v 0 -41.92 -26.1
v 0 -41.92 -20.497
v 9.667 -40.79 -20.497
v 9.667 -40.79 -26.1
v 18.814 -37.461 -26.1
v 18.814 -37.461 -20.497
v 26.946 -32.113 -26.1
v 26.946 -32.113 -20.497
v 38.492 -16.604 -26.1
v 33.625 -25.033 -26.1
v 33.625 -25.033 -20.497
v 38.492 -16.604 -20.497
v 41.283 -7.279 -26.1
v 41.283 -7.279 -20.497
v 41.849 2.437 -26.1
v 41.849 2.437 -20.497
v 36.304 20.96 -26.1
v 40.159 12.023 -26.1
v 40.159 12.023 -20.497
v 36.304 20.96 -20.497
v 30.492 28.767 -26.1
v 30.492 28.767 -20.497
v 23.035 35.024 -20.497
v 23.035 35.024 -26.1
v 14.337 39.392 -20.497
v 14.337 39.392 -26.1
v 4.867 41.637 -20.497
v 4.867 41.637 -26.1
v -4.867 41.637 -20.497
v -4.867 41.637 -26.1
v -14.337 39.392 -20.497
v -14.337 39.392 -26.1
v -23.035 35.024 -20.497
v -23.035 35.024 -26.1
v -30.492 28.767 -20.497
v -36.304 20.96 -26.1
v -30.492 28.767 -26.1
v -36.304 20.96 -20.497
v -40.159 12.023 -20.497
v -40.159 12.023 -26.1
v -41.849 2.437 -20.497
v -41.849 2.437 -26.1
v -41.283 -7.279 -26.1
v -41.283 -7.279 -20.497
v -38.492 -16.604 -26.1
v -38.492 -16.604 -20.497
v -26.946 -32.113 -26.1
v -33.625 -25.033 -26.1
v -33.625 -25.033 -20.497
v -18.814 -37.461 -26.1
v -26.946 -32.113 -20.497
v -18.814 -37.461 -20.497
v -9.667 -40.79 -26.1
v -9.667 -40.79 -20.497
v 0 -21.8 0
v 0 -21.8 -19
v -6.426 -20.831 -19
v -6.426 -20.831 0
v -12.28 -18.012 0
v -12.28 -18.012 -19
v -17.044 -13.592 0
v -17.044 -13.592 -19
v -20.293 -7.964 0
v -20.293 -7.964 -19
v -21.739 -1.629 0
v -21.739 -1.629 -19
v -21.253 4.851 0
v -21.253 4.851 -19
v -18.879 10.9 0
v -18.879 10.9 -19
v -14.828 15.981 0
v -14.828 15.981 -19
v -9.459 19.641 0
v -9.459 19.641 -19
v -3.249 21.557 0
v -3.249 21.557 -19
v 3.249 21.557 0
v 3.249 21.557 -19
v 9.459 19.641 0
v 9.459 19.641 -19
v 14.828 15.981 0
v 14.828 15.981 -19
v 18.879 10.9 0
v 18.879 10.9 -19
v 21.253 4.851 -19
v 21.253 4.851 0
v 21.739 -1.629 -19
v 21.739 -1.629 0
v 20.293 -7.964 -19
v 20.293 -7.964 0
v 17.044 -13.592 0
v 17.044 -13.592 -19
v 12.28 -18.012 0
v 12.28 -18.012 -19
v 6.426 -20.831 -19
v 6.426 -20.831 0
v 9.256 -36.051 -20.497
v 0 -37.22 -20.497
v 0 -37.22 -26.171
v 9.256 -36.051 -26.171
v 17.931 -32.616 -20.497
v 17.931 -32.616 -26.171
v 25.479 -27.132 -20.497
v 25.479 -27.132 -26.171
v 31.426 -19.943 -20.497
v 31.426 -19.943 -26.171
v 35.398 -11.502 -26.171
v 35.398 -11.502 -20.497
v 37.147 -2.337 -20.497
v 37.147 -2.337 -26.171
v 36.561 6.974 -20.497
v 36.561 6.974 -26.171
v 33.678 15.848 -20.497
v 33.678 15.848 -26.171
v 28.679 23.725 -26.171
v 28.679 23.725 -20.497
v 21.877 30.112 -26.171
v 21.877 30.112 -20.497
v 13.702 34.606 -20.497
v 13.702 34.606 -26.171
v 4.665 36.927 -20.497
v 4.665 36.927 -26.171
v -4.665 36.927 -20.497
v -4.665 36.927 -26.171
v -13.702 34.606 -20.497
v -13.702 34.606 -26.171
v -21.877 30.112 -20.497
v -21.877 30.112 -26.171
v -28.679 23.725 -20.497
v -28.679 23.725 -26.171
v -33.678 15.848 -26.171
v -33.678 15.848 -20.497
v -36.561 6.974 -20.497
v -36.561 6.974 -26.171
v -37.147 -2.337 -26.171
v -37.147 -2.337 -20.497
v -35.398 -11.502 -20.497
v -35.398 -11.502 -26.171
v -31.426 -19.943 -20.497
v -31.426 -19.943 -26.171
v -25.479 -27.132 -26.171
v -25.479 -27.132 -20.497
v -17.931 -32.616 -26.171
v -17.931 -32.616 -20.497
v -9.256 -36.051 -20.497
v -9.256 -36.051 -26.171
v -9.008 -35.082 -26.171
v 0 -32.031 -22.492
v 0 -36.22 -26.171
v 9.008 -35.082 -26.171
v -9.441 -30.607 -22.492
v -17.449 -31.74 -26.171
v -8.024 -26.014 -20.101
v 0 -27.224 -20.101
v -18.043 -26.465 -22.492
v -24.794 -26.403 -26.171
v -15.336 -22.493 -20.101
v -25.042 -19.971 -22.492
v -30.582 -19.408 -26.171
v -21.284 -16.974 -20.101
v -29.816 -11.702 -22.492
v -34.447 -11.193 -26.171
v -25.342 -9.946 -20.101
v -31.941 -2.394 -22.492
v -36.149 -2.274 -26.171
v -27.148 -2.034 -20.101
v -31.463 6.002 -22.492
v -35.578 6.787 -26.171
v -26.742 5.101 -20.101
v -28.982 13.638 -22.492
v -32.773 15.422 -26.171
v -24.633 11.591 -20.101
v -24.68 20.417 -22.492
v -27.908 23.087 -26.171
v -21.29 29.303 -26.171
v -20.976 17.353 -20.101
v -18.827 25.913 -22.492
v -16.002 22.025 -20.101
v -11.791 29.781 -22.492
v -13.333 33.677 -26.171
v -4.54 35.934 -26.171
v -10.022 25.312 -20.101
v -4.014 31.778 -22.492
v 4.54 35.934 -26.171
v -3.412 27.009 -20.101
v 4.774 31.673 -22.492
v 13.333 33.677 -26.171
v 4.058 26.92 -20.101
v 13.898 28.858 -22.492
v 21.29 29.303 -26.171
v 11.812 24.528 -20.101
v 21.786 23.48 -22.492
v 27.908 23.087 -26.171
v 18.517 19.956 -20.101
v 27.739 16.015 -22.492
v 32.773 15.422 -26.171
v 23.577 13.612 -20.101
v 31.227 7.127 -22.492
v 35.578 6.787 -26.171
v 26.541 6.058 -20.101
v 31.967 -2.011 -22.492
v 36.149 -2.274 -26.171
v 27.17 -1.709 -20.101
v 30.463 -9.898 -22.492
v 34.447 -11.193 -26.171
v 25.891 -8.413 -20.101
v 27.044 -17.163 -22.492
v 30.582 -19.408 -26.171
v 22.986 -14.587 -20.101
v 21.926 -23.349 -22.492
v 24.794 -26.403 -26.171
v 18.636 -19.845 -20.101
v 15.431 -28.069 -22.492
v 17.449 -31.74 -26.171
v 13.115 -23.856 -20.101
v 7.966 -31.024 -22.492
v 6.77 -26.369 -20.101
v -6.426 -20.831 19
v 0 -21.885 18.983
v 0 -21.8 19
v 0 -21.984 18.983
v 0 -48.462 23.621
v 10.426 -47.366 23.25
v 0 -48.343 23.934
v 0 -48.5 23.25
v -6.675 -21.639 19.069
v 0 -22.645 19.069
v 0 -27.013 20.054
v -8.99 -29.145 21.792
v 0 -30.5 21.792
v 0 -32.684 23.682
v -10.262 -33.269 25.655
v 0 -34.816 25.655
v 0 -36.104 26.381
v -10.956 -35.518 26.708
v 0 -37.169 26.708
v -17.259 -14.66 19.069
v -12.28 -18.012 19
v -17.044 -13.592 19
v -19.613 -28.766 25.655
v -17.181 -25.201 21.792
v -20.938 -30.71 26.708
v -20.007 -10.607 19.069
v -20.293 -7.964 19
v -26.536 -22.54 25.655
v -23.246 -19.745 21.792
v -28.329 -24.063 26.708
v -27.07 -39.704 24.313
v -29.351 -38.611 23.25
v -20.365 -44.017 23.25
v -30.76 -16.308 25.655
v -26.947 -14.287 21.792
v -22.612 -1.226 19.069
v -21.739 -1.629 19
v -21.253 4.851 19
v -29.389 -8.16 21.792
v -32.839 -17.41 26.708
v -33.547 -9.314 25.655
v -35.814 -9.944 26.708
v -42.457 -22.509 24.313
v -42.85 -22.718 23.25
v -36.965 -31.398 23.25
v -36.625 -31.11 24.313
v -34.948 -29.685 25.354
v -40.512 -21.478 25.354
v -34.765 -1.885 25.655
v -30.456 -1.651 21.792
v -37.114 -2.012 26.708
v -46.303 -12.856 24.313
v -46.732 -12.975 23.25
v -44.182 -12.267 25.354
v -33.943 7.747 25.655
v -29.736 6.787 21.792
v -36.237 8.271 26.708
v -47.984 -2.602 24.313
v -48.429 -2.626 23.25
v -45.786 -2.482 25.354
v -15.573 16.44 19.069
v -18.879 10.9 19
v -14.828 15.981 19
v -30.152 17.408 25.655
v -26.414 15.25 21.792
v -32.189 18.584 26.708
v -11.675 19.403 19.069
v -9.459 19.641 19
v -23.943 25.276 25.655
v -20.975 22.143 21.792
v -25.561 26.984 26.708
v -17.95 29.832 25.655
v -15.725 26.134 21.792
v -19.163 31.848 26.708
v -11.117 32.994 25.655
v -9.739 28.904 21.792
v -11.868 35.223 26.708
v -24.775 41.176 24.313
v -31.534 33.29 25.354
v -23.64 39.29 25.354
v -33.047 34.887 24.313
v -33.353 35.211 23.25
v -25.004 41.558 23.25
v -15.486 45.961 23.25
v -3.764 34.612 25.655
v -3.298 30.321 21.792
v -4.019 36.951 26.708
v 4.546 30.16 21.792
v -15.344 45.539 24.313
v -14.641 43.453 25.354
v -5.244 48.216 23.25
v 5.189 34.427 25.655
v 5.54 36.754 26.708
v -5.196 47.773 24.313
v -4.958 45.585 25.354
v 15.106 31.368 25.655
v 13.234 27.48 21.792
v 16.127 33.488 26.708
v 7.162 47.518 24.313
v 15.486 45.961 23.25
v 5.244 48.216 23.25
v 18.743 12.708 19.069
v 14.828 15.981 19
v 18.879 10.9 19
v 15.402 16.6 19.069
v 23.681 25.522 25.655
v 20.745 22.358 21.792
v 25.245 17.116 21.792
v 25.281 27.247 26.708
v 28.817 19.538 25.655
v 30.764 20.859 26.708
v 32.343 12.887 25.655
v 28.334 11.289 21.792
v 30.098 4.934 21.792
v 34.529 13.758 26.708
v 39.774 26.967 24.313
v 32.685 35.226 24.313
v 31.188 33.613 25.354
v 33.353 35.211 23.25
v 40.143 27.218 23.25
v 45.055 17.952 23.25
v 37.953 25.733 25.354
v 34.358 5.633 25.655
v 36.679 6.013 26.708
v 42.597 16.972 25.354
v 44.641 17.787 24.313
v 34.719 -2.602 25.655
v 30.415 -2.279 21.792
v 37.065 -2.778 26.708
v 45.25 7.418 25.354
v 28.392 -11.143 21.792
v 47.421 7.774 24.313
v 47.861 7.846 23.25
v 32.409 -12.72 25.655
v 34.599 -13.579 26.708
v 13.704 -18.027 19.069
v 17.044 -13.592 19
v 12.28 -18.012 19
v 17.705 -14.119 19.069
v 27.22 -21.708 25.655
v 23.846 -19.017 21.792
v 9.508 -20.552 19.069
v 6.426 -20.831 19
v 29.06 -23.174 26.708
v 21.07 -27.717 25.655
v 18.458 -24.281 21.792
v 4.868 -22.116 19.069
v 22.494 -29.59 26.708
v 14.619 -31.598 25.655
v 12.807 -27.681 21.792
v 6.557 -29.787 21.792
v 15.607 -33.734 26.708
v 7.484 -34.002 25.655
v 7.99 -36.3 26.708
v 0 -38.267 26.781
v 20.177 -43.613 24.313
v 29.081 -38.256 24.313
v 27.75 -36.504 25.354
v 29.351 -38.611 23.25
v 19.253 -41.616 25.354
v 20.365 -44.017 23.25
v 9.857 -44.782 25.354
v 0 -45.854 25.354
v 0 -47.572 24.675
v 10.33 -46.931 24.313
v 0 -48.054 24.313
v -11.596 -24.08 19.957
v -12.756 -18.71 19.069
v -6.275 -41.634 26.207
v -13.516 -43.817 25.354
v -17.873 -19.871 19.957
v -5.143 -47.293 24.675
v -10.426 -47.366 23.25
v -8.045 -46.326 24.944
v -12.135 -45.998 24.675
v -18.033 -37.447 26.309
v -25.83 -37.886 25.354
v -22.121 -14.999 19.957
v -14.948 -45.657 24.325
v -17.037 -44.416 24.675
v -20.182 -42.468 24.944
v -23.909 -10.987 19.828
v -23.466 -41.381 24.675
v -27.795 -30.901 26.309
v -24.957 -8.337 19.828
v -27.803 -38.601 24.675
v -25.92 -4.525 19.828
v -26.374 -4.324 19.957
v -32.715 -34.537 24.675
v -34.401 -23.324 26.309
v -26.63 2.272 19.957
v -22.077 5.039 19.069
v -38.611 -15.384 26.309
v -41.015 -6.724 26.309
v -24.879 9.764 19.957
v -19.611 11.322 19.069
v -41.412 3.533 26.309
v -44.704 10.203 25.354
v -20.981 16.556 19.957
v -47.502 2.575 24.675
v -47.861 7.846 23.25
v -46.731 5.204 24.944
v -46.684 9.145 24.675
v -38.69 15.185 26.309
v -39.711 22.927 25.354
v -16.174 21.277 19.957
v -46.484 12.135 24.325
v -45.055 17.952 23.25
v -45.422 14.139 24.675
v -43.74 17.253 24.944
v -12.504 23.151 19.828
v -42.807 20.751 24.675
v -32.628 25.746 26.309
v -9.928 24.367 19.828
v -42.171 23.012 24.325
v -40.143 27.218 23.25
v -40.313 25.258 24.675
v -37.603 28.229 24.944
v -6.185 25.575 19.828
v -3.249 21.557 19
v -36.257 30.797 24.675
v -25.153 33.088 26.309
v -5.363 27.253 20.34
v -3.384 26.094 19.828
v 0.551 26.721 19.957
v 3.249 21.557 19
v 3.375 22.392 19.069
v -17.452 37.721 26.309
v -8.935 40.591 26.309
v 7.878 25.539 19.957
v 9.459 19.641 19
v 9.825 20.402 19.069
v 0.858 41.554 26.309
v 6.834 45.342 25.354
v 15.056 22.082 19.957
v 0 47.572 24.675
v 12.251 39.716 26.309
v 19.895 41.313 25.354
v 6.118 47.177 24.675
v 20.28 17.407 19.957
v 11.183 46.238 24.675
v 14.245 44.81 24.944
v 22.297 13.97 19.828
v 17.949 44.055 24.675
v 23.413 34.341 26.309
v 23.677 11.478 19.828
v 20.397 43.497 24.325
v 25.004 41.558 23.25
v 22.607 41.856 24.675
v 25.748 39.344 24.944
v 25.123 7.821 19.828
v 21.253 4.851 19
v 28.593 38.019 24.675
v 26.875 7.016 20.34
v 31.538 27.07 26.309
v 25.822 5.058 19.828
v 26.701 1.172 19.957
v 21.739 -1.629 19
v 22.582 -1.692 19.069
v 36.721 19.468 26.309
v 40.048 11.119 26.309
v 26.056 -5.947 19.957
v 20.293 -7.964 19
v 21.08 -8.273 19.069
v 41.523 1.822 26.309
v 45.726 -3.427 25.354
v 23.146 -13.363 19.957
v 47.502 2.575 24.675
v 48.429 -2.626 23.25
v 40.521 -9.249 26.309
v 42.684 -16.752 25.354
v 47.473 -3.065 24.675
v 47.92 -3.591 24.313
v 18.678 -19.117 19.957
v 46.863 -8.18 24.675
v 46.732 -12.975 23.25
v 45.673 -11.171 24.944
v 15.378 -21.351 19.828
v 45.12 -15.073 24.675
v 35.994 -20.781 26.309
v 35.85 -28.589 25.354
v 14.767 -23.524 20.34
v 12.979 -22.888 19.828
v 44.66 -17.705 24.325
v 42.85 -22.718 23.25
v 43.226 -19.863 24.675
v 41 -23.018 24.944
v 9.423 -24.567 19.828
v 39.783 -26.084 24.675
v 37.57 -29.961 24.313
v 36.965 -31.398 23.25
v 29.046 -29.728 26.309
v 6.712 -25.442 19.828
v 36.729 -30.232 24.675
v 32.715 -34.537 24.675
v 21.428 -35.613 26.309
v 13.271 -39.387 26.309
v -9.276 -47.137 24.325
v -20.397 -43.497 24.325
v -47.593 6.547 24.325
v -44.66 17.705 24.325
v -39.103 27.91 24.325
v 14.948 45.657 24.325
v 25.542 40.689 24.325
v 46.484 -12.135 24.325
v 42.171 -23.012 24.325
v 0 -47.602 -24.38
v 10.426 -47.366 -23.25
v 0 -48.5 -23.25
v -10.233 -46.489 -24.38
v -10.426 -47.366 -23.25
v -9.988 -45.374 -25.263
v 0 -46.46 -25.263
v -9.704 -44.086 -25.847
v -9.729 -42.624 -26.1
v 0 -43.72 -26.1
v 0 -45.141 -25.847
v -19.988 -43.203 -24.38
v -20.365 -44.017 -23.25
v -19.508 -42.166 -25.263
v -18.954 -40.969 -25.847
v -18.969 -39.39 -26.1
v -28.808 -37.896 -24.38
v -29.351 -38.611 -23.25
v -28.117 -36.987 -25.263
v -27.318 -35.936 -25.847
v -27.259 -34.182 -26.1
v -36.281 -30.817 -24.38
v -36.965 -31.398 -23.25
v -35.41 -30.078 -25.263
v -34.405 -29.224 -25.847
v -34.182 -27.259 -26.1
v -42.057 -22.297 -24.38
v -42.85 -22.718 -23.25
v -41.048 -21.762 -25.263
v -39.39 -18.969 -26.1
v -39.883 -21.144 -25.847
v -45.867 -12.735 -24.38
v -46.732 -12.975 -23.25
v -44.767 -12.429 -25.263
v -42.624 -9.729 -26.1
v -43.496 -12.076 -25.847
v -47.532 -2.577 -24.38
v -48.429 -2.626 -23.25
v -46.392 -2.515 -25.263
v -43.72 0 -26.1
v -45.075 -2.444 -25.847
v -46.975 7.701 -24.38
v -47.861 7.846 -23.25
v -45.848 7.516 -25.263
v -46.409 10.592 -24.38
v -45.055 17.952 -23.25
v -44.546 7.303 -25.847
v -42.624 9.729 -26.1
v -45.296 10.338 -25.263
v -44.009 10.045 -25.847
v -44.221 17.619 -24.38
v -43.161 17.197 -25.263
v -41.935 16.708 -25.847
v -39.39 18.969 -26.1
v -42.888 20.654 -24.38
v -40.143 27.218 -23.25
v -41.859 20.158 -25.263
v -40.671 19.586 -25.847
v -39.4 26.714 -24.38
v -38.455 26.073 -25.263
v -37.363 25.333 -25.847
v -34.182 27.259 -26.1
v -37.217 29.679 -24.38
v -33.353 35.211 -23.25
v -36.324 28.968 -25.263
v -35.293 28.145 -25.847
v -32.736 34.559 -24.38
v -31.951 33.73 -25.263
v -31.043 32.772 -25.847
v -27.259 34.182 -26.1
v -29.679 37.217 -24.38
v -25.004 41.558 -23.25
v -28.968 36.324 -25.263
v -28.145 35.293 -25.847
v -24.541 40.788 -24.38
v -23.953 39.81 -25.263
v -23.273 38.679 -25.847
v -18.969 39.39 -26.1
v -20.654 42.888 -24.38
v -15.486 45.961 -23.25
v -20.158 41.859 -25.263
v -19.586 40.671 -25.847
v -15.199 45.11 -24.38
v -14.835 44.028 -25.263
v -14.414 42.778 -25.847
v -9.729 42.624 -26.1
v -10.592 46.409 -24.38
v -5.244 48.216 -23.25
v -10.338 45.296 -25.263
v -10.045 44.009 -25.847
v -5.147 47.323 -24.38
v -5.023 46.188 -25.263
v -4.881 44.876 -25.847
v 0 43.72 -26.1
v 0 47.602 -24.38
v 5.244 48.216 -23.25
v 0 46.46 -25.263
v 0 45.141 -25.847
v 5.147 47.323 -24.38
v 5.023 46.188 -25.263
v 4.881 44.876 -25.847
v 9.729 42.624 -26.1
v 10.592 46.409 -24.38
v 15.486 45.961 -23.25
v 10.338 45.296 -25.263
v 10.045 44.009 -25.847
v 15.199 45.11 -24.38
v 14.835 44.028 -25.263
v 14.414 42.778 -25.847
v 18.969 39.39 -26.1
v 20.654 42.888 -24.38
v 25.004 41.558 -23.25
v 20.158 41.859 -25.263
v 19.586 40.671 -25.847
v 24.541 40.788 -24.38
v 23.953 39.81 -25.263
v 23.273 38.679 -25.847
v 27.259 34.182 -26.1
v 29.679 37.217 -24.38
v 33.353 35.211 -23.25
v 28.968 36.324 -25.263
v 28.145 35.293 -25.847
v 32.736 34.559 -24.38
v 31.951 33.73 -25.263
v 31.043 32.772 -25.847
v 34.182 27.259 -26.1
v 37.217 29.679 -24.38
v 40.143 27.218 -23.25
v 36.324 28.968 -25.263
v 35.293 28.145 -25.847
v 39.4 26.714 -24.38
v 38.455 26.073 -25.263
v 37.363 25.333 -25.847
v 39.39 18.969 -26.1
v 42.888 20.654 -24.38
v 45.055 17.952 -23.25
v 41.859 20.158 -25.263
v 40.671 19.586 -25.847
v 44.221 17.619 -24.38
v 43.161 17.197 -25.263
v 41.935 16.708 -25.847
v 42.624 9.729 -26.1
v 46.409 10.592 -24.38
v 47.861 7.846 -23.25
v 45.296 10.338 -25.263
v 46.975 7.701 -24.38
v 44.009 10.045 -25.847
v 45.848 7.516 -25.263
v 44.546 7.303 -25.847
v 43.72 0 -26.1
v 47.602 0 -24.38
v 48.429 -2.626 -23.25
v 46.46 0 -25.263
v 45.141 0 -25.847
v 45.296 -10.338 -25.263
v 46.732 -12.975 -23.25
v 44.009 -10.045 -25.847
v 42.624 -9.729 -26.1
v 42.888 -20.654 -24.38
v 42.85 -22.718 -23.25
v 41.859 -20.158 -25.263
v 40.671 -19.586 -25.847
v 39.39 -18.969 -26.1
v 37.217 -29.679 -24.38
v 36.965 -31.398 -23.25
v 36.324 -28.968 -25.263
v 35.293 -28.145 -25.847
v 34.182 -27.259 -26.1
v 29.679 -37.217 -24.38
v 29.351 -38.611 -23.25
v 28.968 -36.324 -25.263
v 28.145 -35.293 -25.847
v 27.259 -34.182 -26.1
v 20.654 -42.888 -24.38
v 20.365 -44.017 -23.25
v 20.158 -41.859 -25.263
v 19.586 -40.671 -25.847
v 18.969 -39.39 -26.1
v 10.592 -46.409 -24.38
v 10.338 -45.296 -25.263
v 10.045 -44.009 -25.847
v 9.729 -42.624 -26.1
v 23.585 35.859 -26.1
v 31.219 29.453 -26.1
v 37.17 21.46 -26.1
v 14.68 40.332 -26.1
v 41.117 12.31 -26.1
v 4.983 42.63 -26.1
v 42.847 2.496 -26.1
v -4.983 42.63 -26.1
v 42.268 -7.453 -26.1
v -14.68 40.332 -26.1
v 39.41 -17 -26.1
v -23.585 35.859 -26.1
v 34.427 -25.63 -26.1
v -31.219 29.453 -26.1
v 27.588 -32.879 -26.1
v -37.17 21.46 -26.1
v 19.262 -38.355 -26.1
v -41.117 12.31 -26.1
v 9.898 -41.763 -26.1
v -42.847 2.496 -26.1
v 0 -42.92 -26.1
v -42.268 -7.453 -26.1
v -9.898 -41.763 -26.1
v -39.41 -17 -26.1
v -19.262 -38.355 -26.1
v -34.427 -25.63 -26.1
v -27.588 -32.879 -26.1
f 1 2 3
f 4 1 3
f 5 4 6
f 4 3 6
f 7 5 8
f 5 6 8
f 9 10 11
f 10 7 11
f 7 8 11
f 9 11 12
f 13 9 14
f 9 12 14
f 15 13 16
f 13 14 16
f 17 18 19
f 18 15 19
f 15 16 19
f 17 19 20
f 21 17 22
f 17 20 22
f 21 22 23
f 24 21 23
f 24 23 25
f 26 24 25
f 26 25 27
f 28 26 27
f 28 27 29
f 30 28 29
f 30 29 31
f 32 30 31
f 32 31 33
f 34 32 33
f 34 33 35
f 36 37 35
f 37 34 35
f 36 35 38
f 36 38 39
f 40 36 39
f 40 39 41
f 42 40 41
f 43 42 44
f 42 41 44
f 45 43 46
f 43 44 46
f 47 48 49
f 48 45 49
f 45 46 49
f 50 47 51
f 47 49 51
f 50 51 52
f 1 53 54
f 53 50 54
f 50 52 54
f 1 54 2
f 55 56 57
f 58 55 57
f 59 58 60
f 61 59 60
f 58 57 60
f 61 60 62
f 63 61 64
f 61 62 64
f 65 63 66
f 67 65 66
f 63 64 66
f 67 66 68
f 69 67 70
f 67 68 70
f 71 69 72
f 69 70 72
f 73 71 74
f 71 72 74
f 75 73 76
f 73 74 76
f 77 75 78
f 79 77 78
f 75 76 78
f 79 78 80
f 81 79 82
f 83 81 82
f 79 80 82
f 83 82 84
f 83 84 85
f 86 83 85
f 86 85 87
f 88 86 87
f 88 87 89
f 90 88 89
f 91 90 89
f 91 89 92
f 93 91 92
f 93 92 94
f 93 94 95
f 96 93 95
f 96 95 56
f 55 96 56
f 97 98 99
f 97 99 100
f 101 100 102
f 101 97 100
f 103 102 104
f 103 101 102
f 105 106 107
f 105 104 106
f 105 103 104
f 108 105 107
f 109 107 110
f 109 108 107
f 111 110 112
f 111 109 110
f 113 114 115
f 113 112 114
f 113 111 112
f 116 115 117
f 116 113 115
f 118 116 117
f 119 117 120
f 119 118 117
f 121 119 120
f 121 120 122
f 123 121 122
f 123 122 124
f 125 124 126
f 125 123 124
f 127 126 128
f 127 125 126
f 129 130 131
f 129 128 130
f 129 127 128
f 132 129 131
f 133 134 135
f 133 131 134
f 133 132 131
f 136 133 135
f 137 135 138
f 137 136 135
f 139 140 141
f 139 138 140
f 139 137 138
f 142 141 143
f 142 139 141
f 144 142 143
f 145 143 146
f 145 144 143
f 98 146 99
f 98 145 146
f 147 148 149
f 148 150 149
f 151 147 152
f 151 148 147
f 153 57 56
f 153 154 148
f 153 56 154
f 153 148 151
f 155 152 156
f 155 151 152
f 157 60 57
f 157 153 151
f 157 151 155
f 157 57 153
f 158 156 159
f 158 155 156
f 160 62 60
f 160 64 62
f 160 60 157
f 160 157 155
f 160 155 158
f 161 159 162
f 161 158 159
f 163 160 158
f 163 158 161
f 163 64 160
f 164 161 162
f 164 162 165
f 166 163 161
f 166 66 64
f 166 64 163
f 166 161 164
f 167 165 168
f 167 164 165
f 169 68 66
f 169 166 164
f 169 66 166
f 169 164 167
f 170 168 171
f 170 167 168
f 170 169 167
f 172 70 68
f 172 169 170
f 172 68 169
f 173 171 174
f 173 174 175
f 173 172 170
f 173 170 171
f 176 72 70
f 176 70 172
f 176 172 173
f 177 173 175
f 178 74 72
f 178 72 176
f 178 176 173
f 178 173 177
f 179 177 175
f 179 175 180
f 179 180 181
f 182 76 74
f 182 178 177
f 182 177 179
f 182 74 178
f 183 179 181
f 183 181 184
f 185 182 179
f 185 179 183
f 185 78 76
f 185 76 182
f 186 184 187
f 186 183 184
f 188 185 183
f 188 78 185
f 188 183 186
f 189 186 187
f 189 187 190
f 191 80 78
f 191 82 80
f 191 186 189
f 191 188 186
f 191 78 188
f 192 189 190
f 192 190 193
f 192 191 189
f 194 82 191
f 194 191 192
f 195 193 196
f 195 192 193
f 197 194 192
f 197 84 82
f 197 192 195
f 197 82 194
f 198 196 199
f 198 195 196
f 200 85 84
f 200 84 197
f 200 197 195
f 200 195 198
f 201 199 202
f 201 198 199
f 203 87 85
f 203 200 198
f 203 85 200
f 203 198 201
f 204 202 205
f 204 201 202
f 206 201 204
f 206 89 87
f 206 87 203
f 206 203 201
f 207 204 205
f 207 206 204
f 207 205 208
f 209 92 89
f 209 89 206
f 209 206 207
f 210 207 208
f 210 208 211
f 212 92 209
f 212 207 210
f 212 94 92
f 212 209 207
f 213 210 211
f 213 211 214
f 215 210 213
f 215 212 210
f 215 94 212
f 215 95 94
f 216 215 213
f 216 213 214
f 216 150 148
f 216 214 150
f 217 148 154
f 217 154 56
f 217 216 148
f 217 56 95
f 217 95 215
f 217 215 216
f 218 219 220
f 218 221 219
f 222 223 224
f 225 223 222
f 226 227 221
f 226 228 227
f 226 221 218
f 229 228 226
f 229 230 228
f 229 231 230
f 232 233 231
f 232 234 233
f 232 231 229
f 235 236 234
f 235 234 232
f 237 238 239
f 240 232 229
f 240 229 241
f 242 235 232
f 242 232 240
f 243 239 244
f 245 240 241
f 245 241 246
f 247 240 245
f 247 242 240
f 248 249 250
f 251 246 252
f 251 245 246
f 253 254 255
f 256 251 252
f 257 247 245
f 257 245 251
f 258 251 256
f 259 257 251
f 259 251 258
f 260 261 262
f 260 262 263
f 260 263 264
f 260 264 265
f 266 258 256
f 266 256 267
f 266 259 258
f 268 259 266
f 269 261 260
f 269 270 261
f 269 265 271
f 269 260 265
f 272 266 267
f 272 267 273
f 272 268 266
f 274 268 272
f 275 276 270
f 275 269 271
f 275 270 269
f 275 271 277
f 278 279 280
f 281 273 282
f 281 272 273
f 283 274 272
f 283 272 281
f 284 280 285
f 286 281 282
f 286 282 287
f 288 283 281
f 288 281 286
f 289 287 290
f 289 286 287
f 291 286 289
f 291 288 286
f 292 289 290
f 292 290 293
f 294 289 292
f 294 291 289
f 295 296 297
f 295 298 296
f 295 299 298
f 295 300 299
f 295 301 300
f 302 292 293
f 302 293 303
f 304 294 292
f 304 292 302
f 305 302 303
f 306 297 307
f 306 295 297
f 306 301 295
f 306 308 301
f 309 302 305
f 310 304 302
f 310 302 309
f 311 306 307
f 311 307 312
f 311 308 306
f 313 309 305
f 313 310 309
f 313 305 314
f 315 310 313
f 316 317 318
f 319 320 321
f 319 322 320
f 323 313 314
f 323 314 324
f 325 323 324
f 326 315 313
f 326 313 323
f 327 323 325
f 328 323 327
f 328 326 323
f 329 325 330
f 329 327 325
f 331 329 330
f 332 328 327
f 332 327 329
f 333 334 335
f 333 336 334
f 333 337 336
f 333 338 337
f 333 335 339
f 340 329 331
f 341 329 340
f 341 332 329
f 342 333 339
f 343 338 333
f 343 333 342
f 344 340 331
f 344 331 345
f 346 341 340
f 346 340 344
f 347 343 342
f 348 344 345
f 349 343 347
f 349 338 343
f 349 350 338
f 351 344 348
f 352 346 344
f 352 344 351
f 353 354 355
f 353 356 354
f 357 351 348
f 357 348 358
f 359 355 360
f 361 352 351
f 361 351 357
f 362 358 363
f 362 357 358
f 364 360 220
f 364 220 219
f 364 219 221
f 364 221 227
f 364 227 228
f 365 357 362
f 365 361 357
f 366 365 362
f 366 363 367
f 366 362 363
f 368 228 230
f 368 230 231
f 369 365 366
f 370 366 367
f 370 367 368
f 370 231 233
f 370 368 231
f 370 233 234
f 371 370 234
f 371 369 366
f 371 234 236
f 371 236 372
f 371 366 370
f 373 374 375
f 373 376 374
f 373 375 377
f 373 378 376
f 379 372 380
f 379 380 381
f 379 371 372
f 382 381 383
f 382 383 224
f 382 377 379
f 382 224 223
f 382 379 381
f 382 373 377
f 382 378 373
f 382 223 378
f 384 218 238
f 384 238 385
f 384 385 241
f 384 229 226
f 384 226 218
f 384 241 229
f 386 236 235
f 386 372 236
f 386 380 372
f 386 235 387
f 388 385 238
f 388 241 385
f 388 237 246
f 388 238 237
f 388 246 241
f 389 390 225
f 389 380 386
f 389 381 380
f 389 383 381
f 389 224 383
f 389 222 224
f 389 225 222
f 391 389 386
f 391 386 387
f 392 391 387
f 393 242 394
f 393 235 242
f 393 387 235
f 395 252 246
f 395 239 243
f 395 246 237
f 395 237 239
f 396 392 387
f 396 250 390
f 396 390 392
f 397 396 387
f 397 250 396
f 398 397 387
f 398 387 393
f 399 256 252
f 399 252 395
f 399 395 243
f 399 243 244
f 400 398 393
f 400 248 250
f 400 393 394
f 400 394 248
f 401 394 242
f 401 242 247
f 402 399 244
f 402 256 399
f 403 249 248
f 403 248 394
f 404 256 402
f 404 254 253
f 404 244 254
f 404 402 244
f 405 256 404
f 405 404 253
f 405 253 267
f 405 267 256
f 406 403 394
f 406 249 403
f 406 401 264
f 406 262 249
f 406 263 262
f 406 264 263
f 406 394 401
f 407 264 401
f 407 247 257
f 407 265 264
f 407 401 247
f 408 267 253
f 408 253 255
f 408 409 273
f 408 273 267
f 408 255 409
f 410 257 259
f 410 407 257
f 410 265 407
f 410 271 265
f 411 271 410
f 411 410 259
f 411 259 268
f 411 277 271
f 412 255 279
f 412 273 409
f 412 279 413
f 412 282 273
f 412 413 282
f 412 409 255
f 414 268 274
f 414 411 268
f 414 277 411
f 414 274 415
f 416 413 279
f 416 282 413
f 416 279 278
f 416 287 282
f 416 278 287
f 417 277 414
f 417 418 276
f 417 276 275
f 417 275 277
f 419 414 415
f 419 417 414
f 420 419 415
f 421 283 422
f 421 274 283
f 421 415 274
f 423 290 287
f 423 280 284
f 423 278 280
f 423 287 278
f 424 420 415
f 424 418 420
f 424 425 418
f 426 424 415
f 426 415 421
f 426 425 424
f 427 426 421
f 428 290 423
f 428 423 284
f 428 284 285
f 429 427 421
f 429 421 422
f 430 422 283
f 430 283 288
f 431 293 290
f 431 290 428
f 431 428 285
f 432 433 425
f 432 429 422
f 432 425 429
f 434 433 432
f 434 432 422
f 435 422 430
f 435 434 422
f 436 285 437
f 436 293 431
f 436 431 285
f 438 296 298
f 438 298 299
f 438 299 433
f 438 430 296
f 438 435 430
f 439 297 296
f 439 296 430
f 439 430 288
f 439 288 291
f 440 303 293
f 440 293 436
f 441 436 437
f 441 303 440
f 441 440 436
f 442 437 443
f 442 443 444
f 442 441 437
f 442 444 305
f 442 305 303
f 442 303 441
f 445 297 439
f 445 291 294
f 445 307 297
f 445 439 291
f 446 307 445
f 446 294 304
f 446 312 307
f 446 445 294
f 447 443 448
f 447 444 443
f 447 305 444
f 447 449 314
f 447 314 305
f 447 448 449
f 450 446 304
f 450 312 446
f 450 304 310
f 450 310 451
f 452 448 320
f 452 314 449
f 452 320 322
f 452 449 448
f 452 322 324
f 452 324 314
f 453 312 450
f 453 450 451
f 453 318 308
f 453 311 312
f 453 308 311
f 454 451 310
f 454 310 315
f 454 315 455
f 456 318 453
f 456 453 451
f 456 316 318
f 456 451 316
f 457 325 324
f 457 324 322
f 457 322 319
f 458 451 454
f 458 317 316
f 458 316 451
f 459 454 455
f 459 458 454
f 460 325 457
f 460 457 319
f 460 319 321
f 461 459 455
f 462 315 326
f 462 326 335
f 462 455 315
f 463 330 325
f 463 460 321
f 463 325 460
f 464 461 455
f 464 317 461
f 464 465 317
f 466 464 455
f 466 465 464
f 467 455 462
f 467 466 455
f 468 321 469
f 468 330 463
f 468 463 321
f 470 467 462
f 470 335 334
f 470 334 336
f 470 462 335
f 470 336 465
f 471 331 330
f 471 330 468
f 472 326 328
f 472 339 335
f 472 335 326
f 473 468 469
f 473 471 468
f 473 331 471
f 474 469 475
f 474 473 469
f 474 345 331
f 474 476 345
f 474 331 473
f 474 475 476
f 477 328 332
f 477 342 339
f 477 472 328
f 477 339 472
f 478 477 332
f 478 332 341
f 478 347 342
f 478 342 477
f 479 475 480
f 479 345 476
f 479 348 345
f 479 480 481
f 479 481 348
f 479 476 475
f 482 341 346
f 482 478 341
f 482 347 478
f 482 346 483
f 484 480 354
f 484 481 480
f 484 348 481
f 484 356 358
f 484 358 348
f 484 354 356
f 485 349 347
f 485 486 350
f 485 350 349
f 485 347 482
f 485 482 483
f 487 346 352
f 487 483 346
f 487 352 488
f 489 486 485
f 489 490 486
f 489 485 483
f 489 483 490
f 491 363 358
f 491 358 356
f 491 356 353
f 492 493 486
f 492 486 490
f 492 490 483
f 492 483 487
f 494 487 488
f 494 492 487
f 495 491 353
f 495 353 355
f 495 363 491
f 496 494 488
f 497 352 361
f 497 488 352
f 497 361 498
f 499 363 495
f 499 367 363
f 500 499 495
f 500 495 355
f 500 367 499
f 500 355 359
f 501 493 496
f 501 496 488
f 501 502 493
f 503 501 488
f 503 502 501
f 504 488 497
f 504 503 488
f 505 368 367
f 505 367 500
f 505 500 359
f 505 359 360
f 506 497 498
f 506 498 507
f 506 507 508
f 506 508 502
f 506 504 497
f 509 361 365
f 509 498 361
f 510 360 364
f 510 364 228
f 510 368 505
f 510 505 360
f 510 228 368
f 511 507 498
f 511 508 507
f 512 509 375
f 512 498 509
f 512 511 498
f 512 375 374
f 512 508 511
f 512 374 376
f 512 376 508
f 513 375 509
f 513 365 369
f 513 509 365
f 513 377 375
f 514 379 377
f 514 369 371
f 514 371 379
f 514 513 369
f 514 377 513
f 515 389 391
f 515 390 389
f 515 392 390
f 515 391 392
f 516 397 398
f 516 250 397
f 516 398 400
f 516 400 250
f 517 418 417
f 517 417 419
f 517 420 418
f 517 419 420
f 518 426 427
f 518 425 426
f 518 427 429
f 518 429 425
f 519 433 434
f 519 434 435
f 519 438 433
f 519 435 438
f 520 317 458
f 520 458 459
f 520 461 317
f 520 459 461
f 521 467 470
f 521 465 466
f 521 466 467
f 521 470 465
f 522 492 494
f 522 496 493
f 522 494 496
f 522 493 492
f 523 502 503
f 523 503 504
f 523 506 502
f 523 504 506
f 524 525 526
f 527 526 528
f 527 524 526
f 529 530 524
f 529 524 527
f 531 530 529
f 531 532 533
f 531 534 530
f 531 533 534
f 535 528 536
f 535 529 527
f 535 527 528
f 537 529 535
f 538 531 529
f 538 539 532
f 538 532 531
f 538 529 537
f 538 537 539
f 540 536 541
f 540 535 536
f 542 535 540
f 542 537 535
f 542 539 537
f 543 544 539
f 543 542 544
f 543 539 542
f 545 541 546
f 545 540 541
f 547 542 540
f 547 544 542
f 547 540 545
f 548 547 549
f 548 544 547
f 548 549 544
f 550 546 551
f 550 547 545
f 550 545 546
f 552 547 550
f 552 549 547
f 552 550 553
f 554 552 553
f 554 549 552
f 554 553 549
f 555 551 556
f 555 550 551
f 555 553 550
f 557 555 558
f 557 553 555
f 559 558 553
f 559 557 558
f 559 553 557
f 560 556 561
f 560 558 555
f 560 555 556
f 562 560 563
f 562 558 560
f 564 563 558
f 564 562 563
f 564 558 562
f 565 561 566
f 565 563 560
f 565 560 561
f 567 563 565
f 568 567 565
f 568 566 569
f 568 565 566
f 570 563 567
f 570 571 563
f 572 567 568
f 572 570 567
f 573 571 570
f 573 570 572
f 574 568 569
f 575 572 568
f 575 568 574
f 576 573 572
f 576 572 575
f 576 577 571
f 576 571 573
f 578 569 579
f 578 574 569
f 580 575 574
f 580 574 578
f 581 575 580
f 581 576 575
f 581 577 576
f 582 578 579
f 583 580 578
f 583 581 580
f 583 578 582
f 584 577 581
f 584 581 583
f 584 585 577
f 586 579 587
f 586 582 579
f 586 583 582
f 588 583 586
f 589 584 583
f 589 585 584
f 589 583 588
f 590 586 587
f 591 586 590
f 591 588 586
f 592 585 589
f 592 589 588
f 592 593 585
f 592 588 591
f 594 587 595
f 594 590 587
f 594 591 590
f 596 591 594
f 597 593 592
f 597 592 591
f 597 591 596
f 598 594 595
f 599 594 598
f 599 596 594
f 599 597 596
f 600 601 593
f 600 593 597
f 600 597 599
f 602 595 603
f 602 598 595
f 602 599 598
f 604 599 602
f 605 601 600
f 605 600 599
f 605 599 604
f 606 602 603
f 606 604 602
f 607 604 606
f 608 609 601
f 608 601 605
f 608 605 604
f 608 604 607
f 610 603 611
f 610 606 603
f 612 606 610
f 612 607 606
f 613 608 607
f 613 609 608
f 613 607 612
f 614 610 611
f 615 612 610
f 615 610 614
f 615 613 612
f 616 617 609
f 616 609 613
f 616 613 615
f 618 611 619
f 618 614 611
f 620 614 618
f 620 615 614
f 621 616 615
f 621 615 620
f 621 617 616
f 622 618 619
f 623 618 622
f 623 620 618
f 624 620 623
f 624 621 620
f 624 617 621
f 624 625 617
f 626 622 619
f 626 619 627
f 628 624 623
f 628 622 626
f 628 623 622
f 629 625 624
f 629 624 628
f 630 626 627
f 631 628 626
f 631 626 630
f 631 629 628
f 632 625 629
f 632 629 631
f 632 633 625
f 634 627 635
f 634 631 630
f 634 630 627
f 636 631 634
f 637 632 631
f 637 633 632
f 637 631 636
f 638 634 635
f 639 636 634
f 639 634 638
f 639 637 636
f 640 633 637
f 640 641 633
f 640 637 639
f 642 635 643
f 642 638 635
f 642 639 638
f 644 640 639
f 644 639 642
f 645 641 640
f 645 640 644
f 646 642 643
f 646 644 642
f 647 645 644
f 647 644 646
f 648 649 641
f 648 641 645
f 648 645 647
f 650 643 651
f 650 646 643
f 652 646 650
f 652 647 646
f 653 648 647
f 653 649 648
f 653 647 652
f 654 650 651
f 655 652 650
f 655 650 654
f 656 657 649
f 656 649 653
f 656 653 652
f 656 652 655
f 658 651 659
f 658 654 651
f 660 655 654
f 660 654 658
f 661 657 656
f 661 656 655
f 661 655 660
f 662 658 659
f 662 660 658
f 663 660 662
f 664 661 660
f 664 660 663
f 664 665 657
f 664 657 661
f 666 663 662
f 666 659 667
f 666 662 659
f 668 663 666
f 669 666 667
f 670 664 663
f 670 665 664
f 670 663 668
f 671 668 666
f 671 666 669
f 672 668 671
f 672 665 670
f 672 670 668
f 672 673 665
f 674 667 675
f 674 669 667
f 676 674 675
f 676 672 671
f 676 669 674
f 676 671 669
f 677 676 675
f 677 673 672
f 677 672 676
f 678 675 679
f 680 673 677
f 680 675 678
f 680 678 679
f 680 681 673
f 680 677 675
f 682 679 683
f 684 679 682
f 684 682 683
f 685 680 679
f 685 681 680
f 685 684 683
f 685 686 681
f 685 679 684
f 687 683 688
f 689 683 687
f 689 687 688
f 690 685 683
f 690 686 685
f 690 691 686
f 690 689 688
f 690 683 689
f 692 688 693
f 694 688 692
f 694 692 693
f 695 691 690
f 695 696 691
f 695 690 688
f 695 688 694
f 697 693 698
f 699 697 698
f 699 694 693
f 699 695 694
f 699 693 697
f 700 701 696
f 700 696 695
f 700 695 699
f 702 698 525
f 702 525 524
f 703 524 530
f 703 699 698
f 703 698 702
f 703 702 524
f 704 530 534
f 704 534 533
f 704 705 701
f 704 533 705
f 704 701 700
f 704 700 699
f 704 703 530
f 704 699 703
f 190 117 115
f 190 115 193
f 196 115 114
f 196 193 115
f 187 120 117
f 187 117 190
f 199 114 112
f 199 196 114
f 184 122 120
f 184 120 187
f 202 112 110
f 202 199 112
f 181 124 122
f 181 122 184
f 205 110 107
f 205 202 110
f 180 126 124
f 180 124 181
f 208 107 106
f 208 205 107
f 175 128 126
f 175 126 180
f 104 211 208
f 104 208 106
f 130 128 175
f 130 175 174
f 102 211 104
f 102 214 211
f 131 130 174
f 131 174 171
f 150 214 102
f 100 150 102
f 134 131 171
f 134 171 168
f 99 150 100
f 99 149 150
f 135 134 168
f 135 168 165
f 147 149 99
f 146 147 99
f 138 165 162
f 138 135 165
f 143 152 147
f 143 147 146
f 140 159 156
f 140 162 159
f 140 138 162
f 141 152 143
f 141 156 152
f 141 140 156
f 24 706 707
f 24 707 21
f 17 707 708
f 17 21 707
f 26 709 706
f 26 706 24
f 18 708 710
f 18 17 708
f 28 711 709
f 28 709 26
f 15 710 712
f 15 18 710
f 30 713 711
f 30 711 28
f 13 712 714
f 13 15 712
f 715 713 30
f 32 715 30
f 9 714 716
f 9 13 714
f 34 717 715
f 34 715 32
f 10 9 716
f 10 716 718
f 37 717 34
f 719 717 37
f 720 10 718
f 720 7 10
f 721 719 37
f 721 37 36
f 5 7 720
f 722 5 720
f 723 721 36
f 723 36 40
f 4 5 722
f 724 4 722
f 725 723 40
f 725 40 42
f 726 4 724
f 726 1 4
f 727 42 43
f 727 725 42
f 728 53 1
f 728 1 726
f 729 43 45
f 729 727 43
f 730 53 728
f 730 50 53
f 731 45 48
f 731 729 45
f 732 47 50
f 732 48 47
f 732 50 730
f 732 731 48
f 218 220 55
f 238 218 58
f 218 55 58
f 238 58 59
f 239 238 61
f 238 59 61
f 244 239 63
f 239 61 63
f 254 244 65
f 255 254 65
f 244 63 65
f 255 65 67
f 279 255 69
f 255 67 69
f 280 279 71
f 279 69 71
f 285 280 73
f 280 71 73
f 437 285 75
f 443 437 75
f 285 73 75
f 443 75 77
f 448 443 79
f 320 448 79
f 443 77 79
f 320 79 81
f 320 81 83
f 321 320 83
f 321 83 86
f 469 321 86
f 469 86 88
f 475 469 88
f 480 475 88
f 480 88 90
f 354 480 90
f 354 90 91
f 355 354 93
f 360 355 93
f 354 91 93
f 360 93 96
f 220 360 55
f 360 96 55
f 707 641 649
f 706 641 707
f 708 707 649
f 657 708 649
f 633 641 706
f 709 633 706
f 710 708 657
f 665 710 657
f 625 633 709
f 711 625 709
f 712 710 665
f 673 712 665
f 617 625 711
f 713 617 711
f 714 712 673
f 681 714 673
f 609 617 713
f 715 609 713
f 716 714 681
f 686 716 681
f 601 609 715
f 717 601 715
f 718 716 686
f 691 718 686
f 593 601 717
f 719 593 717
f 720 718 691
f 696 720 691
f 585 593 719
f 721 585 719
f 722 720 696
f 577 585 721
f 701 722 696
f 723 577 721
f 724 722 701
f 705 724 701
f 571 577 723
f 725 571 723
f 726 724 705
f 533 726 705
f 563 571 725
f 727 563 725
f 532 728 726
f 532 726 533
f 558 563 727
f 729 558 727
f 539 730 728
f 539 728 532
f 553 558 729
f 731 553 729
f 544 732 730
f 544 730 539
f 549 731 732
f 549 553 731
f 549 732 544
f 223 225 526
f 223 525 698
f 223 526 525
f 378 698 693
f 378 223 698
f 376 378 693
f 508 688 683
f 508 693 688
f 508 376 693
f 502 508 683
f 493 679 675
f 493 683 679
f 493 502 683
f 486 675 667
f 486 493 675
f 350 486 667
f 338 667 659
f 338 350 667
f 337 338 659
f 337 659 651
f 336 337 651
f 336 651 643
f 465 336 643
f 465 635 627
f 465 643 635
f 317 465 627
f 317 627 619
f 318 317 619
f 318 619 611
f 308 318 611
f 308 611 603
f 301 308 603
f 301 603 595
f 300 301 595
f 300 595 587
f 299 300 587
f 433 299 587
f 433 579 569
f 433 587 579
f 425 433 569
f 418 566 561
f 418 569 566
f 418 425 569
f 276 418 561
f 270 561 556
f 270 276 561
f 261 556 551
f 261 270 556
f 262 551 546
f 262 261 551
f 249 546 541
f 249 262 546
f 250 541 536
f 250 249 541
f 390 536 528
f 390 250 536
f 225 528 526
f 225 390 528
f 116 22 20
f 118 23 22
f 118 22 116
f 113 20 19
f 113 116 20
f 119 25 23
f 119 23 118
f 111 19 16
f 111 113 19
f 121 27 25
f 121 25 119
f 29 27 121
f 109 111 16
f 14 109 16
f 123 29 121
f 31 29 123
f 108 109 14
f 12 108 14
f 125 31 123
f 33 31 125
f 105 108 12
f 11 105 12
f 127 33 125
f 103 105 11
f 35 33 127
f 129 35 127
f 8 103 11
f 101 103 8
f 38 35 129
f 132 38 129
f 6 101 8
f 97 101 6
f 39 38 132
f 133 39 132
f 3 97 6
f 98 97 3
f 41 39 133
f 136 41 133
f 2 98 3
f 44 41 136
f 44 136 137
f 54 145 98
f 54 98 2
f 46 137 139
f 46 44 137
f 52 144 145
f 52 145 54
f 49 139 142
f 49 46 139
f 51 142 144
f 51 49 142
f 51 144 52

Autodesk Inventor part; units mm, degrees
ref_plane "YZ Plane" through (0, 0, 0) normal (1, 0, 0) x (0, 1, 0)
ref_plane "XZ Plane" through (0, 0, 0) normal (0, 1, 0) x (-1, 0, 0)
ref_plane "XY Plane" through (0, 0, 0) normal (0, 0, 1) x (1, 0, 0)
sketch "Sketch1" plane through (0, 0, 0) normal (1, 0, 0) x (0, 1, 0)
  spline S0 degree 3 poles (-21.8, 19) (-21.8911, 18.9704) (-23.5777, 19.1791) (-27.2185, 19.809) (-31.5857, 22.2001) (-34.2433, 25.5665) (-37.0578, 26.9358) (-39.8917, 26.6297) (-42.8949, 26.0623) (-45.8688, 25.4606) (-48.1326, 24.4893) (-48.5091, 23.6382) (-48.5, 23.25) knots 0 0 0 0 0.008681 0.173507 0.363577 0.490264 0.601083 0.655384 0.772555 0.905868 0.967377 1 1 1 1
  line L0 (-48.5, -23.25) -> (-48.5, 23.25)
  arc A0 (-48.5, -23.25) -> (-43.72, -26.1) centre (-43.3877, -20.1092) ccw
  line L1 (-42.92, -26.1) -> (-43.72, -26.1)
  spline S1 degree 3 poles (-36.22, -26.1708) (-32.3391, -21.8472) (-27.5324, -19.457) (-21.8, -19) knots 0 0 0 0 1 1 1 1
  line L2 (-21.8, 19) -> (-21.8, -19)
  line L3 (0, 0) -> (-21.8, 0)
  line L4 (-21.8, 19) -> (-21.8, -19)
  line L5 (-36.22, -26.1708) -> (-37.22, -26.1708)
  line L6 (-37.22, -26.1708) -> (-37.22, -20.4971)
  line L7 (-37.22, -20.4971) -> (-41.92, -20.4971)
  line L8 (-42.92, -26.1) -> (-41.92, -26.1)
  line L9 (-41.92, -26.1) -> (-41.92, -20.4971)
  line L10 (0, 0) -> (0, -18.1714)
  dimension "d0" = 21.8
  dimension "d1" = 38
  dimension "d2" = 1
  dimension "d3" = 1
  dimension "d4" = 4.7
  dimension "d5" = 5.6737
  dimension "d6" = 6
  dimension "d7" = 48.5
revolve "Revolution1" add sketch "Sketch1" angle 360 about axis through (0, 0, 0) along (0, 0, -1)
properties part number "Urethane 97mm" material "Plastic, Opaque Black"
